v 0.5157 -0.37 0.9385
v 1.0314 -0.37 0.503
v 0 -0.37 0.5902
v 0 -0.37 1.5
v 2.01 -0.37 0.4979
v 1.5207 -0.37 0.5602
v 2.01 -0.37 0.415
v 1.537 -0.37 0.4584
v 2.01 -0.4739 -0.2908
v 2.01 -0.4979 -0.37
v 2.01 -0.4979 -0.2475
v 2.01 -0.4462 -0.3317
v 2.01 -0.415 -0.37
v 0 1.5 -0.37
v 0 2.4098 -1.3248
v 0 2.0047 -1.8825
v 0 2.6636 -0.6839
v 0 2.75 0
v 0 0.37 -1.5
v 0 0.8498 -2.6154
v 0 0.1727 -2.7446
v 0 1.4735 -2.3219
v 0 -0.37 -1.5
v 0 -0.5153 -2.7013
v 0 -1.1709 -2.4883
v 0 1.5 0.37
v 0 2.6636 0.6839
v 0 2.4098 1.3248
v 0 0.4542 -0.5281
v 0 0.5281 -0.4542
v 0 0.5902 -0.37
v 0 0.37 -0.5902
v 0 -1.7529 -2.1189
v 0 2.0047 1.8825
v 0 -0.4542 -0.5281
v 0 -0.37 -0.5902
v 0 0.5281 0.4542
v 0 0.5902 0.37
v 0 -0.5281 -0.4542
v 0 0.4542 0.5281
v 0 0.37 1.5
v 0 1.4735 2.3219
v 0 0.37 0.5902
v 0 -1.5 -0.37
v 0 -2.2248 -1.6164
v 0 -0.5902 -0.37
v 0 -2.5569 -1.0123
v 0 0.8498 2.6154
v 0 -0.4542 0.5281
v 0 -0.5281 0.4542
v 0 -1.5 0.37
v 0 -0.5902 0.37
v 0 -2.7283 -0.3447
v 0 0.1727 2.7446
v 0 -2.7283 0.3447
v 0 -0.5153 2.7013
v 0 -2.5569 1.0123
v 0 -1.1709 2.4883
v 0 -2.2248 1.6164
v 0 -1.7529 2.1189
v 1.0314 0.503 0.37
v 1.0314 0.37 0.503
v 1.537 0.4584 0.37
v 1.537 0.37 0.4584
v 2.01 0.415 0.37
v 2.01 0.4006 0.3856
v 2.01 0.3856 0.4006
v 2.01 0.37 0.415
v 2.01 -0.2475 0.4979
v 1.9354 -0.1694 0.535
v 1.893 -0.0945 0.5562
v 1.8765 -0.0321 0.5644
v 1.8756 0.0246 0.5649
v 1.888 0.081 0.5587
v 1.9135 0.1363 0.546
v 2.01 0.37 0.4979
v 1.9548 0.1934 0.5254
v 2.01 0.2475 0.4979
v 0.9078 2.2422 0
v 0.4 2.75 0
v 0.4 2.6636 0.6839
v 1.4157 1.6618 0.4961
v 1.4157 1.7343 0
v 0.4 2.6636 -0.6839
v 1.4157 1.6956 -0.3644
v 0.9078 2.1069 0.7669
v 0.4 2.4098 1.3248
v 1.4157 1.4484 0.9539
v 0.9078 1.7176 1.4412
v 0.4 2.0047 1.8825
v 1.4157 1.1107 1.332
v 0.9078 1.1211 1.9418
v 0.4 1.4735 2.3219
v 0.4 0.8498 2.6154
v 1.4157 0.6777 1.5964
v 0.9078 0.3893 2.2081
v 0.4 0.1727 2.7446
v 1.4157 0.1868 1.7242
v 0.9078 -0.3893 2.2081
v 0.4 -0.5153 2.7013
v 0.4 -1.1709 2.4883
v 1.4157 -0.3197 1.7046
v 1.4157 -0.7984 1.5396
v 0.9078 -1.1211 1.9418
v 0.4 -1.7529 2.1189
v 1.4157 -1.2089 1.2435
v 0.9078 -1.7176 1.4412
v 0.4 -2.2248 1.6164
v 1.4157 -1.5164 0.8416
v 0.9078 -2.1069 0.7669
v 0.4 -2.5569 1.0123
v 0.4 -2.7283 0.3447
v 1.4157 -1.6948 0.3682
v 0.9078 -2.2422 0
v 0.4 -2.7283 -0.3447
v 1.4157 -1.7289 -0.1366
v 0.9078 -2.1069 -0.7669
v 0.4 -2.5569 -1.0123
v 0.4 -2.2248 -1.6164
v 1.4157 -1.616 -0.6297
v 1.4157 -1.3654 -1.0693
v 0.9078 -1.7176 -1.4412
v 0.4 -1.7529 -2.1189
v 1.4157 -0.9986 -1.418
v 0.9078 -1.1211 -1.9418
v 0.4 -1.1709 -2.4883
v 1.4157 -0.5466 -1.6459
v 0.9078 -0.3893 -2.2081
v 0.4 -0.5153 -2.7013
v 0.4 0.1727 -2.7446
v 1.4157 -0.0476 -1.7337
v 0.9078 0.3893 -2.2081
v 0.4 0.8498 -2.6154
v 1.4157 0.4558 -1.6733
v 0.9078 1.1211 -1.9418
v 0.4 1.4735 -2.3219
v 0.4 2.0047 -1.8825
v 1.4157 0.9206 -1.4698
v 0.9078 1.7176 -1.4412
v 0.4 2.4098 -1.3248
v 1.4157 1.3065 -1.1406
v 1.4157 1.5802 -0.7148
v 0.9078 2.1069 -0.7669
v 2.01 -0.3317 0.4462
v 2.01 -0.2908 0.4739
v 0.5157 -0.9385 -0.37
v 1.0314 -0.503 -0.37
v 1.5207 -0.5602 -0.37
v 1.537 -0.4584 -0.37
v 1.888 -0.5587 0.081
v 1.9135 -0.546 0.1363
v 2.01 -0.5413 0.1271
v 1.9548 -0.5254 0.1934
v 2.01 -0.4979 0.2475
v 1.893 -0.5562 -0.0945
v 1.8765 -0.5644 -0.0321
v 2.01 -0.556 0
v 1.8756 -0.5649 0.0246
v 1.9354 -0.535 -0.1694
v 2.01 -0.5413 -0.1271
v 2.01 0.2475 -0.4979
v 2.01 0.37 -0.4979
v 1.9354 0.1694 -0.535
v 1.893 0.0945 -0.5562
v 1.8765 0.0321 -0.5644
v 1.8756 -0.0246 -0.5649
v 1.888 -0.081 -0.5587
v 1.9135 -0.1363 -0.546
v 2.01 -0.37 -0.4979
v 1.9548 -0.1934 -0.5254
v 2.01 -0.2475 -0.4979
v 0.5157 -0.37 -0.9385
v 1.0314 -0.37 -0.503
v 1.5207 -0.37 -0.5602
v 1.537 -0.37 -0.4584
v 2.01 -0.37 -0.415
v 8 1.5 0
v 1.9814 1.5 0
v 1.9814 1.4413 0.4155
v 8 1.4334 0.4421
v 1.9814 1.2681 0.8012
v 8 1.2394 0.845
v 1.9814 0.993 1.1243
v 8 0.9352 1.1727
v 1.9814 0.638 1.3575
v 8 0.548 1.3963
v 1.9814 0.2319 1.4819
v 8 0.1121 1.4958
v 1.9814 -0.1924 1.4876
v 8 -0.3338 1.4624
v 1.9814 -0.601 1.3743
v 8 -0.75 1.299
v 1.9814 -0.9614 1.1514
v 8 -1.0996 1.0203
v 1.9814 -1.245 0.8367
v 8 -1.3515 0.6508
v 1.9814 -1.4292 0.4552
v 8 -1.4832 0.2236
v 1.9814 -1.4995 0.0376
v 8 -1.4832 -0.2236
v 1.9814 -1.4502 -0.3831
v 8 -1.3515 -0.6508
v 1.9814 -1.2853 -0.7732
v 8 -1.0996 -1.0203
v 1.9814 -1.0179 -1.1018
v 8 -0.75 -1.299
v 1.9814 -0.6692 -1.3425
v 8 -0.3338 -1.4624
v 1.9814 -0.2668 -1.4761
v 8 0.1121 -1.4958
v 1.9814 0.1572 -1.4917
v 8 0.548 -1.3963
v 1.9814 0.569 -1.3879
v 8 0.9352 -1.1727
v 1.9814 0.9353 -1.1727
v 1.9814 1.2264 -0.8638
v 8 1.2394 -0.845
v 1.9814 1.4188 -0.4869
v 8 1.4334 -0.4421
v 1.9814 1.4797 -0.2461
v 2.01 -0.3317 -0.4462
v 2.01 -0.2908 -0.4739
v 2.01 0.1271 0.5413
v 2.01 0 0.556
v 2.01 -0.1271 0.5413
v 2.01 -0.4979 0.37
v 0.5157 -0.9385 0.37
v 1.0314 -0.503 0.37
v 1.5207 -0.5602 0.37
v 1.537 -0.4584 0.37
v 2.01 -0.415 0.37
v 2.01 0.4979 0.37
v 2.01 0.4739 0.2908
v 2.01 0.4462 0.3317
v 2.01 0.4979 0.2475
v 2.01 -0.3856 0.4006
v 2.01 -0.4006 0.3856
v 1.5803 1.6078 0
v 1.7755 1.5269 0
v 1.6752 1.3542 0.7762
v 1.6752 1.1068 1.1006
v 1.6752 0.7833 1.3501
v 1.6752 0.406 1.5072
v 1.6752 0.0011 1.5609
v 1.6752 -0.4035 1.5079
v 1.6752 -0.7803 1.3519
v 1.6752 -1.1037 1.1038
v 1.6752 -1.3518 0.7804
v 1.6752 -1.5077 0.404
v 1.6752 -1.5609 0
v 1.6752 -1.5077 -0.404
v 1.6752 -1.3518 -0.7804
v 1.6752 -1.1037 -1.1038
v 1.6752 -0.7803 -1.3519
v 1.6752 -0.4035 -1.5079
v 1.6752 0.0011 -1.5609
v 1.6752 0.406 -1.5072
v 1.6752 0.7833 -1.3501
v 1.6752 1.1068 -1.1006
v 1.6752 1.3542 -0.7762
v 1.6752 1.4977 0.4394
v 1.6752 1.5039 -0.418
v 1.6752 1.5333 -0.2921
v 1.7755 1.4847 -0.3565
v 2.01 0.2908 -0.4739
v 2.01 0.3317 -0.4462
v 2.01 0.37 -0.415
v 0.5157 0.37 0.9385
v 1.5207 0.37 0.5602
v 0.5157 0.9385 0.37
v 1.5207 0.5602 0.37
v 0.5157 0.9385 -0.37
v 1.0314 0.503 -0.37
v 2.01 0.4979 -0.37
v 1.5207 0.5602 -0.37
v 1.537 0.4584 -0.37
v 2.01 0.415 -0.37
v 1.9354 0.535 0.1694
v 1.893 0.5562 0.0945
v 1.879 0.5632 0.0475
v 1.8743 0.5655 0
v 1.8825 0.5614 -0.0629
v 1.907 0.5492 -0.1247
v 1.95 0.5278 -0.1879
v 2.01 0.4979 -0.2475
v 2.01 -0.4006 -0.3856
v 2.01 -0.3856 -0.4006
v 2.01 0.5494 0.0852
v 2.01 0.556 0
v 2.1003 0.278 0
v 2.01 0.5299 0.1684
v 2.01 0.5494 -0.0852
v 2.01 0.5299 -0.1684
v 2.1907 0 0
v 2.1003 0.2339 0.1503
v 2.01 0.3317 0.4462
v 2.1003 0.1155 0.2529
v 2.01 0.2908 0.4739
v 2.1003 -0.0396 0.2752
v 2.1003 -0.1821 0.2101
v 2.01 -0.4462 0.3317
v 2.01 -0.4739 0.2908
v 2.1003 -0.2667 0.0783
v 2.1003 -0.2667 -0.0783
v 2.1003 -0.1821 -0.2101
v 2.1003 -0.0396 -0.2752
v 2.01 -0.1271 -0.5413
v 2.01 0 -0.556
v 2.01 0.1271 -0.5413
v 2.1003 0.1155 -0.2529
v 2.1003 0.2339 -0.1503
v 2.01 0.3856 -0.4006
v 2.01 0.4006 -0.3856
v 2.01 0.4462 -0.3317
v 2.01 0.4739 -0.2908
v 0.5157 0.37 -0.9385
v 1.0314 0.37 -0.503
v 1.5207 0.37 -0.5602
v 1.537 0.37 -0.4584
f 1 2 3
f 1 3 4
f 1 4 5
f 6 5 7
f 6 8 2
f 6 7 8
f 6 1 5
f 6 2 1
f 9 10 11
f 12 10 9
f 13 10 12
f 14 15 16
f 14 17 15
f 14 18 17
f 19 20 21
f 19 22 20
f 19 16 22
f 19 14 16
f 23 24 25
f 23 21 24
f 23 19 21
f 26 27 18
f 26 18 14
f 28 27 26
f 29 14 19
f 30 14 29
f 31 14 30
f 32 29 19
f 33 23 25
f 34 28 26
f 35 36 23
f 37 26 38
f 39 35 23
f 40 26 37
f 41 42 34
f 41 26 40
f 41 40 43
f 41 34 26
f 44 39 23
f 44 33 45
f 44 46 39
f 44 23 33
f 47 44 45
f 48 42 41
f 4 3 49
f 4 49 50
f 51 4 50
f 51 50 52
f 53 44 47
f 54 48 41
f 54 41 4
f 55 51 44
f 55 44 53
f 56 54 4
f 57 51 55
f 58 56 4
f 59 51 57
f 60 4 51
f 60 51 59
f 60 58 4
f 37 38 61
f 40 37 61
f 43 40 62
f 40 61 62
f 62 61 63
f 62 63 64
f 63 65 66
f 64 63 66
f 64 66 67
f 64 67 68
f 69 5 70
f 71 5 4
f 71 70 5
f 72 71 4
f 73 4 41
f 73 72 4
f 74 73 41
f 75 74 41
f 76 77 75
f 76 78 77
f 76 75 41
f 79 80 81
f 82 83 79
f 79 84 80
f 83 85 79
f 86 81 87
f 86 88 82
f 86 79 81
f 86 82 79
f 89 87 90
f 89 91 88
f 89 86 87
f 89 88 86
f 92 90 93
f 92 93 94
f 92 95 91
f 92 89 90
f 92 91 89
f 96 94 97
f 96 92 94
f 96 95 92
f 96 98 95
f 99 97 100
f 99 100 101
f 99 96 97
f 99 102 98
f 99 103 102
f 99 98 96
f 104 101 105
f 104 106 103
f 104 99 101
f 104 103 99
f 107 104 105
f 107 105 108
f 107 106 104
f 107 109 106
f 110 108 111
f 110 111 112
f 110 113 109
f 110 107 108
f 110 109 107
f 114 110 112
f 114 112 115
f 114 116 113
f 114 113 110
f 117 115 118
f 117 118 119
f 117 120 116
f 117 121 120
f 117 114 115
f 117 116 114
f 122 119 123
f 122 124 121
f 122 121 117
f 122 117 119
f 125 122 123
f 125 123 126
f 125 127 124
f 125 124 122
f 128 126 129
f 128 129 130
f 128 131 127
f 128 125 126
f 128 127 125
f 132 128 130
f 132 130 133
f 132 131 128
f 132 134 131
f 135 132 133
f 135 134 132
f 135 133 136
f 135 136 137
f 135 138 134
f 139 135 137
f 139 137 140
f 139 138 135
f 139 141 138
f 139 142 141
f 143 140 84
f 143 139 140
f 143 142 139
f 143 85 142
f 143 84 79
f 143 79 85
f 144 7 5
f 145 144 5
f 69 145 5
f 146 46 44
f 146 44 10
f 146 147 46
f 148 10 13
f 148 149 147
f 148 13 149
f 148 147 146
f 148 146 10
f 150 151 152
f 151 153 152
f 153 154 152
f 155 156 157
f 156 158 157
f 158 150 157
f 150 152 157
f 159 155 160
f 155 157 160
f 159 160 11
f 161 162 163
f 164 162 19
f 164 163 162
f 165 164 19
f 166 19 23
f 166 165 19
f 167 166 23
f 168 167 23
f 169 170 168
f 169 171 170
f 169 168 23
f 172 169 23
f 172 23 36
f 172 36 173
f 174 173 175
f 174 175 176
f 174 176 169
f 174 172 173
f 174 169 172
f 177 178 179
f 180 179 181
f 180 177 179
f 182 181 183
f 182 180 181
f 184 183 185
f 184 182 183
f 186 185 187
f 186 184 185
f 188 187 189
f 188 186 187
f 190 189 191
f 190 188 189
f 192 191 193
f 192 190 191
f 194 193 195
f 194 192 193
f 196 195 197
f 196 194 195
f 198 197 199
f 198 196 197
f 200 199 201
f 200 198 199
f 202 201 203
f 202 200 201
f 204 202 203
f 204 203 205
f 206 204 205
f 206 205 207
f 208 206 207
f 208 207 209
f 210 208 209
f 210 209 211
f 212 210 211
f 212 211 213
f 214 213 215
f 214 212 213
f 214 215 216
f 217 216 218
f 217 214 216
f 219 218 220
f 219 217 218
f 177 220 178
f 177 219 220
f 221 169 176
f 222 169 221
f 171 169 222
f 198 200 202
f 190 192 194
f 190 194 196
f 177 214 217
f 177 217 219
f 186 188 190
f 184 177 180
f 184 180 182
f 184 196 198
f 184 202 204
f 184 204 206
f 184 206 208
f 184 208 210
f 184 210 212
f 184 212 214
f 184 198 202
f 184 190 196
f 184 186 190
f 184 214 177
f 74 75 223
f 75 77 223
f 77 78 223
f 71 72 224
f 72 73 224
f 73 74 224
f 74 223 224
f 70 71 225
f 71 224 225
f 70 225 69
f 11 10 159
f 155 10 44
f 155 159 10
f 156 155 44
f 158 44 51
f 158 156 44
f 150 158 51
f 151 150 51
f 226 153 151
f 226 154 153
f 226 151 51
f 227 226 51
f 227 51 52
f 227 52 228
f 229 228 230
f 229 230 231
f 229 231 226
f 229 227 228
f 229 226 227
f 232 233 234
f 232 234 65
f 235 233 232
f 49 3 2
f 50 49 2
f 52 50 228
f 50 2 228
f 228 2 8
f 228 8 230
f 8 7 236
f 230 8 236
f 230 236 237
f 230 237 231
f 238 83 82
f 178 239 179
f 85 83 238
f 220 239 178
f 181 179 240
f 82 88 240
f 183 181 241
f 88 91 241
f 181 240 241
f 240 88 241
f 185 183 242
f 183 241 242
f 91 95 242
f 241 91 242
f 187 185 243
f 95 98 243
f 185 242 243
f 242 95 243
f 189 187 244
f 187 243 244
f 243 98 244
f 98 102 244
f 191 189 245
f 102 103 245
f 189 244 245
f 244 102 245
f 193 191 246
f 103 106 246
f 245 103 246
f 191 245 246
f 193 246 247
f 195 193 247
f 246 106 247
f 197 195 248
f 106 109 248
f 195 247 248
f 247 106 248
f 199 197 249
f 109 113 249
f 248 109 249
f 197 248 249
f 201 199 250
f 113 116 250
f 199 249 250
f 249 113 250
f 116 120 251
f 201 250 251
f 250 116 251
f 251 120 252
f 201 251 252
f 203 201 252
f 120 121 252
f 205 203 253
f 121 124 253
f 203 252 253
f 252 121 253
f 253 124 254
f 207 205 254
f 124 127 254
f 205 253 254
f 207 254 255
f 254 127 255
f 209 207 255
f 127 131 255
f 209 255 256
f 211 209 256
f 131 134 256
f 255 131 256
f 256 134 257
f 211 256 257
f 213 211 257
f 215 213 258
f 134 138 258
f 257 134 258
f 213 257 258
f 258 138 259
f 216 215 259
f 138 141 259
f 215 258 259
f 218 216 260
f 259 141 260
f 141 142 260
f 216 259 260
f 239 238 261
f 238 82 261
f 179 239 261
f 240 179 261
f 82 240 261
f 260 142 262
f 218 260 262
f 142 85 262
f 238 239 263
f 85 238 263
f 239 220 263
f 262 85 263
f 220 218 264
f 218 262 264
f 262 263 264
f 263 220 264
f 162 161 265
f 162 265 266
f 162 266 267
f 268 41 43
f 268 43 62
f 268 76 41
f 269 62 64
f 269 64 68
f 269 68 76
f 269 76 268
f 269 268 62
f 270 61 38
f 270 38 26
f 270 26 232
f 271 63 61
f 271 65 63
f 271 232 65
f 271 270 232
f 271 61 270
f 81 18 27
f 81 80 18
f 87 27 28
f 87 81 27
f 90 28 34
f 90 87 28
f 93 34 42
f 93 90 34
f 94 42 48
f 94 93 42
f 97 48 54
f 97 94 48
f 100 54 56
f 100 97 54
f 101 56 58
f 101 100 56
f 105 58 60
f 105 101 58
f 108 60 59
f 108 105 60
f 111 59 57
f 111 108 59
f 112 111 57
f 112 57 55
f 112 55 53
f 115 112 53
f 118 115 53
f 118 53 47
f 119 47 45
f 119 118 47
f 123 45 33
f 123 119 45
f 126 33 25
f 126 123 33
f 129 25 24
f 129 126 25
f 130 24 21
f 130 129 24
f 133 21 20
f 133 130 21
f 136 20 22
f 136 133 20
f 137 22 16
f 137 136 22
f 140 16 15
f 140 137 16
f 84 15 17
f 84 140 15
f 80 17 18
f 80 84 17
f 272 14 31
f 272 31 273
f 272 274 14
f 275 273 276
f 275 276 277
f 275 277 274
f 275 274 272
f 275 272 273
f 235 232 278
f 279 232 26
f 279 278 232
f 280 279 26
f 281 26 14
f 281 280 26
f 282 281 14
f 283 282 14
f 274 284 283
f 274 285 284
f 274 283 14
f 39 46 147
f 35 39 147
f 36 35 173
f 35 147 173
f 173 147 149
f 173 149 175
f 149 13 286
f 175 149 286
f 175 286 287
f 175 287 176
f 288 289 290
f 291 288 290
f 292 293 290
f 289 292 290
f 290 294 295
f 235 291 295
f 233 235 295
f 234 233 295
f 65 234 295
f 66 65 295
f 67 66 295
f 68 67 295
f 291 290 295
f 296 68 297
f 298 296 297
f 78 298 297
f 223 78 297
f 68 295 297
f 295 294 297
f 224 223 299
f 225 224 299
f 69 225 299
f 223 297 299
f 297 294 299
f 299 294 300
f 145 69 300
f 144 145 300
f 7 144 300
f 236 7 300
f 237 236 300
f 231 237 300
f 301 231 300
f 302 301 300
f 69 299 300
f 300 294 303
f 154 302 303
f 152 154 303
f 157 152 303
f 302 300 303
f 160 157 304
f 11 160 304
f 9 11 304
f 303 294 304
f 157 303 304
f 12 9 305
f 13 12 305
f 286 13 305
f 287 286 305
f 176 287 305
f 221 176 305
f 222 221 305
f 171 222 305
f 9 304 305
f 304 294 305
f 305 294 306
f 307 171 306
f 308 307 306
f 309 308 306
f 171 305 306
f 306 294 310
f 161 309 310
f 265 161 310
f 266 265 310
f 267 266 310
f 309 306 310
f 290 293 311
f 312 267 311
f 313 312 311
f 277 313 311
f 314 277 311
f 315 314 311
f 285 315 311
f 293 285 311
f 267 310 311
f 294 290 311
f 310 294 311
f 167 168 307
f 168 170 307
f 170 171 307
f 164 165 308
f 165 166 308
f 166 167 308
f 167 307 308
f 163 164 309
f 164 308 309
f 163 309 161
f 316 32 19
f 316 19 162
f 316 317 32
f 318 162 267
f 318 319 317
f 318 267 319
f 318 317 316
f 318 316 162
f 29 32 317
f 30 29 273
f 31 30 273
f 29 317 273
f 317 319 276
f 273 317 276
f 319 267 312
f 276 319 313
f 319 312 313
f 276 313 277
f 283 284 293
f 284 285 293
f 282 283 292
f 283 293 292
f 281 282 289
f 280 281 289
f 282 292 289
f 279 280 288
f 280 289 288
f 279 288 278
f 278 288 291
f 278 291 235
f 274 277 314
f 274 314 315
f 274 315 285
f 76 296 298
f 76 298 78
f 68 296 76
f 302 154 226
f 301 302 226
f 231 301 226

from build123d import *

# Parameters (mm, degrees)
FILLET1_R    = 0.8
SKETCH3_W    = 0.74
SKETCH3_H    = 3
SKETCH4_W    = 0.74
SKETCH4_H    = 0.99570227
RECPAT_COUNT = 2
RECPAT_ANGLE = 90


with BuildPart() as part:
    # BodySke → Base-Revolve (revolve)
    with BuildSketch(Plane.XY):
        Polygon((0, 0), (0, 2.75), (0.4, 2.75), (1.65, 1.5), (8, 1.5), (8, 0), align=None)
    revolve(axis=Axis((-6.35, 0, 0), (1, 0, 0)))

    # Fillet1
    fillet1_edges = [part.edges().sort_by_distance(p)[0] for p in [
        (1.65, -1.5, 0),
    ]]
    fillet(fillet1_edges, radius=FILLET1_R)

    # Sketch3 → Recess section 0
    with BuildSketch(Plane.ZY):
        Rectangle(SKETCH3_W, SKETCH3_H)
    # Sketch4 → Recess section 1
    with BuildSketch(Plane.ZY.offset(-2.01)):
        Rectangle(SKETCH4_W, SKETCH4_H)
    recess = loft(mode=Mode.SUBTRACT)

    # RecPat: Recess ×2 about axis
    recpat_axis = Axis((0, 0, 0), (1, 0, 0))
    for i in range(1, RECPAT_COUNT):
        add(recess.rotate(recpat_axis, i * RECPAT_ANGLE / (RECPAT_COUNT - 1)), mode=Mode.SUBTRACT)

    # RecCorSke → RecessCore (revolve, cut)
    with BuildSketch(Plane.XY):
        Polygon((0, 0), (0, 0.696552892), (2.01, 0.556), (2.190655351, 0), align=None)
    revolve(axis=Axis((-3.175, 0, 0), (1, 0, 0)), mode=Mode.SUBTRACT)


solid = part.part
